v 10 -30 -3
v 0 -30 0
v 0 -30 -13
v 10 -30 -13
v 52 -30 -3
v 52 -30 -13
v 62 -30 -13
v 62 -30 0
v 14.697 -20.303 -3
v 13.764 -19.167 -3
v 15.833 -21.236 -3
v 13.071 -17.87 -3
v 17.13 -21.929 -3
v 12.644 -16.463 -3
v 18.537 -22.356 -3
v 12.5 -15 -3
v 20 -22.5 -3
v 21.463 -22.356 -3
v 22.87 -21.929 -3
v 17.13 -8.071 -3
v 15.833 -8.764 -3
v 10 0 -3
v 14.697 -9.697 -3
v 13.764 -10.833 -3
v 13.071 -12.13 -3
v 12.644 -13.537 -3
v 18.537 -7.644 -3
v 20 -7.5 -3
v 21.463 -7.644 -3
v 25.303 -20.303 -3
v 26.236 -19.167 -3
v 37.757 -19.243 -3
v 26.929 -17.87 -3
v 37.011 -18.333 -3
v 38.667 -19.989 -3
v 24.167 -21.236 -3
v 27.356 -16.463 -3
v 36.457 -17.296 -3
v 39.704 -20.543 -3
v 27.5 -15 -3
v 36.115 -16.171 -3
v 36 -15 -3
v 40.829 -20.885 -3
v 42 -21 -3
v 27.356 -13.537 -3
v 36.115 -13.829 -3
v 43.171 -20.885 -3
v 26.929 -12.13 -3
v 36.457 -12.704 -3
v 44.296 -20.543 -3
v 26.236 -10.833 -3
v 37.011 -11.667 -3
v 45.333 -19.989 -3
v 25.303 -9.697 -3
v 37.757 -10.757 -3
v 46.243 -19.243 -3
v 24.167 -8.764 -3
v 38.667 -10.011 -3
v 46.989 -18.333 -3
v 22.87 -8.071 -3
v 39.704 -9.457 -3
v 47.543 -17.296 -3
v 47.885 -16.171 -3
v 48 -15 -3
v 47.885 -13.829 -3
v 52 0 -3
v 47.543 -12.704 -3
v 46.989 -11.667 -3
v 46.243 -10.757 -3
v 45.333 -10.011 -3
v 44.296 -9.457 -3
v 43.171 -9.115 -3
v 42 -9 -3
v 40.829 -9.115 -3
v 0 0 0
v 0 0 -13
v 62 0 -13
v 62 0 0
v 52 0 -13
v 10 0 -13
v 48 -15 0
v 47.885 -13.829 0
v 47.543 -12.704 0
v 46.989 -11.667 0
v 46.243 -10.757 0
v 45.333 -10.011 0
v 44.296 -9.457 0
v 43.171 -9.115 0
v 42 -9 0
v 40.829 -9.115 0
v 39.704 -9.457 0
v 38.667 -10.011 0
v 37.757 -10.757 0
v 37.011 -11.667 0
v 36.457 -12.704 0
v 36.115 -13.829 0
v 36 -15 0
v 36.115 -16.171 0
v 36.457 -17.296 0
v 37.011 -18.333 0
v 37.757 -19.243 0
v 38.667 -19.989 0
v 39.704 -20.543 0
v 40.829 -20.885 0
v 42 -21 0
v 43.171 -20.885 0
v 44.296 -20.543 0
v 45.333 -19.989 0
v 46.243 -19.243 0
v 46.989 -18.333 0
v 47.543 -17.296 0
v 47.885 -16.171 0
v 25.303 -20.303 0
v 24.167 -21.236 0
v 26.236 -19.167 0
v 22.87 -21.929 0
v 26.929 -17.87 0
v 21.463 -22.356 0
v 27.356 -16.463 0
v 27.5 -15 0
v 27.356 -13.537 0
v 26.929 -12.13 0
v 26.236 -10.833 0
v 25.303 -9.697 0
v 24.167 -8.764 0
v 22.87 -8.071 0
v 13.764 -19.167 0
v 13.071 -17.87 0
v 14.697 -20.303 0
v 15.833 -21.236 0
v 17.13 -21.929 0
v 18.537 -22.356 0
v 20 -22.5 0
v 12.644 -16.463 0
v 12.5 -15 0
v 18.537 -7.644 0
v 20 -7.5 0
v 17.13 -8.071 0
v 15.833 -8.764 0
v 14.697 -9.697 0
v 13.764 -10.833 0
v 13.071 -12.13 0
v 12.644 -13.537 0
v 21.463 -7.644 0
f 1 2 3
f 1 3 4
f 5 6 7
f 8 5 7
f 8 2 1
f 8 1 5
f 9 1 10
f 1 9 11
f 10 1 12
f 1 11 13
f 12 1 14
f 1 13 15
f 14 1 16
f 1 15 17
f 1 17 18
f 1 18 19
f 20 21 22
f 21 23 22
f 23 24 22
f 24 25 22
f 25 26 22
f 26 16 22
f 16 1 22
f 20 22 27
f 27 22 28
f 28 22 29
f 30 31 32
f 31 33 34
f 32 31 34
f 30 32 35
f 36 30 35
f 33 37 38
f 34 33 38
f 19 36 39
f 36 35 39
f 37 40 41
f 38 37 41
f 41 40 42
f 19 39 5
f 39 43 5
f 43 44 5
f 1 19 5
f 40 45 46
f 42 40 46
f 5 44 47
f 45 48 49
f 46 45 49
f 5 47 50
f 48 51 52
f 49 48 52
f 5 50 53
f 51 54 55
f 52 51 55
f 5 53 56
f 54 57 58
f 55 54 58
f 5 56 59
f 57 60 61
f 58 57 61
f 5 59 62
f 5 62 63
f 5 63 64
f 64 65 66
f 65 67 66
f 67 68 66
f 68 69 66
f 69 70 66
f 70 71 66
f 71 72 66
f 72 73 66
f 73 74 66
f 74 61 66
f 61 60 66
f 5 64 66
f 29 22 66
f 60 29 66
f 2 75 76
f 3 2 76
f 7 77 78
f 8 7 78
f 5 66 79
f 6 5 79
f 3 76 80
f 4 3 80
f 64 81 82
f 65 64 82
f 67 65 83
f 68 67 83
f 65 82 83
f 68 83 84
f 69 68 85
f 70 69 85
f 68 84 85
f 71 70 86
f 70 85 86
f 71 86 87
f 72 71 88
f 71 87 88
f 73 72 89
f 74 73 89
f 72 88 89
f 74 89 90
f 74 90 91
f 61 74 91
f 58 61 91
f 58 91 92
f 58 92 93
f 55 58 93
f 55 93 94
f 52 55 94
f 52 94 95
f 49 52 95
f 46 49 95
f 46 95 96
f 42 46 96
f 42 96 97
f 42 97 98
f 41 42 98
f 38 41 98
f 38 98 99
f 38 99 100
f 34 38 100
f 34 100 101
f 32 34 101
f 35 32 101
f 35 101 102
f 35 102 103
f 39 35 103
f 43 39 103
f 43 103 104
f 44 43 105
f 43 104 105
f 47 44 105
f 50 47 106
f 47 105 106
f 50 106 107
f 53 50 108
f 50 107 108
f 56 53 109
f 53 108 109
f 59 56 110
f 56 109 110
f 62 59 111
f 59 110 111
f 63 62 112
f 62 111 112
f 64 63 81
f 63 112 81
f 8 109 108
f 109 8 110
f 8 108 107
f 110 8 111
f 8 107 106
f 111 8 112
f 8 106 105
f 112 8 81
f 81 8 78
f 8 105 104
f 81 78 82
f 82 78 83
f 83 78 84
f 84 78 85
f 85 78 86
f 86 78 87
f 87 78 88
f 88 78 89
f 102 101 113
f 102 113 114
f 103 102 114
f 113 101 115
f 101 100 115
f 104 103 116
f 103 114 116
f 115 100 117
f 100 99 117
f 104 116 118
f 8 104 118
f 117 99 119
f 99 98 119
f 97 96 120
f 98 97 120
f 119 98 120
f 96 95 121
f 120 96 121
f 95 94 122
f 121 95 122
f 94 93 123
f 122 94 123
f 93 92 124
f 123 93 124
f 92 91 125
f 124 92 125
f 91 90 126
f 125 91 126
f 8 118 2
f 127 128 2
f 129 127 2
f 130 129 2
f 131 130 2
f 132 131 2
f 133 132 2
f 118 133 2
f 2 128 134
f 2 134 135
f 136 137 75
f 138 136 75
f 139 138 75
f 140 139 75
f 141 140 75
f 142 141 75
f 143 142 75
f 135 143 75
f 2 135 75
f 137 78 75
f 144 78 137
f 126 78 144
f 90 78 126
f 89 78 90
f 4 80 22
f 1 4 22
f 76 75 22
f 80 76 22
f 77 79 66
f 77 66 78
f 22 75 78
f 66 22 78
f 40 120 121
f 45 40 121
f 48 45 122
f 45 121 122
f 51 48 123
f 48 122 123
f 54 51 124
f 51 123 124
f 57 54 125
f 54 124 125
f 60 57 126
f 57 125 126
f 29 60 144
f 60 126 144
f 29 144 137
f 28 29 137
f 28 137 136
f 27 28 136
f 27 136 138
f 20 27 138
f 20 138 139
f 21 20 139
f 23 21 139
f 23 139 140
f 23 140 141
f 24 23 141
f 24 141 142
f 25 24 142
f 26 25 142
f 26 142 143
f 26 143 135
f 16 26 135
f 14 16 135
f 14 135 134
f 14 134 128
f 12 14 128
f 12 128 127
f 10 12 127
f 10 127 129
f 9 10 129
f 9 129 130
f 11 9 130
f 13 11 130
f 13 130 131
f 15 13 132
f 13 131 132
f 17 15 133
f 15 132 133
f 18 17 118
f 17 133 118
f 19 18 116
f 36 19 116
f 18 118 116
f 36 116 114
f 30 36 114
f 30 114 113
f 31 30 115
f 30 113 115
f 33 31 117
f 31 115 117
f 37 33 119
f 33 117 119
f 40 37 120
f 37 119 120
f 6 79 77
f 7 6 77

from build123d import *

# Parameters (mm, degrees)
F1_DEPTH = 30
F2_R     = 7.5
F2_R_2   = 6
F3_DEPTH = 13.001


with BuildPart() as f1:
    # F0 (on Front) → F1 (new body)
    with BuildSketch(Plane.XZ):
        Polygon((62, 0), (0, 0), (0, -13), (10, -13), (10, -3), (52, -3), (52, -13), (62, -13), align=None)
    extrude(amount=F1_DEPTH)

    # F2 (on face) → F3 (cut, through all)
    with BuildSketch(Plane.XY):
        with Locations((20, -15)):
            Circle(F2_R)
        with Locations((42, -15)):
            Circle(F2_R_2)
    extrude(amount=-F3_DEPTH, mode=Mode.SUBTRACT)


solid = f1.part
